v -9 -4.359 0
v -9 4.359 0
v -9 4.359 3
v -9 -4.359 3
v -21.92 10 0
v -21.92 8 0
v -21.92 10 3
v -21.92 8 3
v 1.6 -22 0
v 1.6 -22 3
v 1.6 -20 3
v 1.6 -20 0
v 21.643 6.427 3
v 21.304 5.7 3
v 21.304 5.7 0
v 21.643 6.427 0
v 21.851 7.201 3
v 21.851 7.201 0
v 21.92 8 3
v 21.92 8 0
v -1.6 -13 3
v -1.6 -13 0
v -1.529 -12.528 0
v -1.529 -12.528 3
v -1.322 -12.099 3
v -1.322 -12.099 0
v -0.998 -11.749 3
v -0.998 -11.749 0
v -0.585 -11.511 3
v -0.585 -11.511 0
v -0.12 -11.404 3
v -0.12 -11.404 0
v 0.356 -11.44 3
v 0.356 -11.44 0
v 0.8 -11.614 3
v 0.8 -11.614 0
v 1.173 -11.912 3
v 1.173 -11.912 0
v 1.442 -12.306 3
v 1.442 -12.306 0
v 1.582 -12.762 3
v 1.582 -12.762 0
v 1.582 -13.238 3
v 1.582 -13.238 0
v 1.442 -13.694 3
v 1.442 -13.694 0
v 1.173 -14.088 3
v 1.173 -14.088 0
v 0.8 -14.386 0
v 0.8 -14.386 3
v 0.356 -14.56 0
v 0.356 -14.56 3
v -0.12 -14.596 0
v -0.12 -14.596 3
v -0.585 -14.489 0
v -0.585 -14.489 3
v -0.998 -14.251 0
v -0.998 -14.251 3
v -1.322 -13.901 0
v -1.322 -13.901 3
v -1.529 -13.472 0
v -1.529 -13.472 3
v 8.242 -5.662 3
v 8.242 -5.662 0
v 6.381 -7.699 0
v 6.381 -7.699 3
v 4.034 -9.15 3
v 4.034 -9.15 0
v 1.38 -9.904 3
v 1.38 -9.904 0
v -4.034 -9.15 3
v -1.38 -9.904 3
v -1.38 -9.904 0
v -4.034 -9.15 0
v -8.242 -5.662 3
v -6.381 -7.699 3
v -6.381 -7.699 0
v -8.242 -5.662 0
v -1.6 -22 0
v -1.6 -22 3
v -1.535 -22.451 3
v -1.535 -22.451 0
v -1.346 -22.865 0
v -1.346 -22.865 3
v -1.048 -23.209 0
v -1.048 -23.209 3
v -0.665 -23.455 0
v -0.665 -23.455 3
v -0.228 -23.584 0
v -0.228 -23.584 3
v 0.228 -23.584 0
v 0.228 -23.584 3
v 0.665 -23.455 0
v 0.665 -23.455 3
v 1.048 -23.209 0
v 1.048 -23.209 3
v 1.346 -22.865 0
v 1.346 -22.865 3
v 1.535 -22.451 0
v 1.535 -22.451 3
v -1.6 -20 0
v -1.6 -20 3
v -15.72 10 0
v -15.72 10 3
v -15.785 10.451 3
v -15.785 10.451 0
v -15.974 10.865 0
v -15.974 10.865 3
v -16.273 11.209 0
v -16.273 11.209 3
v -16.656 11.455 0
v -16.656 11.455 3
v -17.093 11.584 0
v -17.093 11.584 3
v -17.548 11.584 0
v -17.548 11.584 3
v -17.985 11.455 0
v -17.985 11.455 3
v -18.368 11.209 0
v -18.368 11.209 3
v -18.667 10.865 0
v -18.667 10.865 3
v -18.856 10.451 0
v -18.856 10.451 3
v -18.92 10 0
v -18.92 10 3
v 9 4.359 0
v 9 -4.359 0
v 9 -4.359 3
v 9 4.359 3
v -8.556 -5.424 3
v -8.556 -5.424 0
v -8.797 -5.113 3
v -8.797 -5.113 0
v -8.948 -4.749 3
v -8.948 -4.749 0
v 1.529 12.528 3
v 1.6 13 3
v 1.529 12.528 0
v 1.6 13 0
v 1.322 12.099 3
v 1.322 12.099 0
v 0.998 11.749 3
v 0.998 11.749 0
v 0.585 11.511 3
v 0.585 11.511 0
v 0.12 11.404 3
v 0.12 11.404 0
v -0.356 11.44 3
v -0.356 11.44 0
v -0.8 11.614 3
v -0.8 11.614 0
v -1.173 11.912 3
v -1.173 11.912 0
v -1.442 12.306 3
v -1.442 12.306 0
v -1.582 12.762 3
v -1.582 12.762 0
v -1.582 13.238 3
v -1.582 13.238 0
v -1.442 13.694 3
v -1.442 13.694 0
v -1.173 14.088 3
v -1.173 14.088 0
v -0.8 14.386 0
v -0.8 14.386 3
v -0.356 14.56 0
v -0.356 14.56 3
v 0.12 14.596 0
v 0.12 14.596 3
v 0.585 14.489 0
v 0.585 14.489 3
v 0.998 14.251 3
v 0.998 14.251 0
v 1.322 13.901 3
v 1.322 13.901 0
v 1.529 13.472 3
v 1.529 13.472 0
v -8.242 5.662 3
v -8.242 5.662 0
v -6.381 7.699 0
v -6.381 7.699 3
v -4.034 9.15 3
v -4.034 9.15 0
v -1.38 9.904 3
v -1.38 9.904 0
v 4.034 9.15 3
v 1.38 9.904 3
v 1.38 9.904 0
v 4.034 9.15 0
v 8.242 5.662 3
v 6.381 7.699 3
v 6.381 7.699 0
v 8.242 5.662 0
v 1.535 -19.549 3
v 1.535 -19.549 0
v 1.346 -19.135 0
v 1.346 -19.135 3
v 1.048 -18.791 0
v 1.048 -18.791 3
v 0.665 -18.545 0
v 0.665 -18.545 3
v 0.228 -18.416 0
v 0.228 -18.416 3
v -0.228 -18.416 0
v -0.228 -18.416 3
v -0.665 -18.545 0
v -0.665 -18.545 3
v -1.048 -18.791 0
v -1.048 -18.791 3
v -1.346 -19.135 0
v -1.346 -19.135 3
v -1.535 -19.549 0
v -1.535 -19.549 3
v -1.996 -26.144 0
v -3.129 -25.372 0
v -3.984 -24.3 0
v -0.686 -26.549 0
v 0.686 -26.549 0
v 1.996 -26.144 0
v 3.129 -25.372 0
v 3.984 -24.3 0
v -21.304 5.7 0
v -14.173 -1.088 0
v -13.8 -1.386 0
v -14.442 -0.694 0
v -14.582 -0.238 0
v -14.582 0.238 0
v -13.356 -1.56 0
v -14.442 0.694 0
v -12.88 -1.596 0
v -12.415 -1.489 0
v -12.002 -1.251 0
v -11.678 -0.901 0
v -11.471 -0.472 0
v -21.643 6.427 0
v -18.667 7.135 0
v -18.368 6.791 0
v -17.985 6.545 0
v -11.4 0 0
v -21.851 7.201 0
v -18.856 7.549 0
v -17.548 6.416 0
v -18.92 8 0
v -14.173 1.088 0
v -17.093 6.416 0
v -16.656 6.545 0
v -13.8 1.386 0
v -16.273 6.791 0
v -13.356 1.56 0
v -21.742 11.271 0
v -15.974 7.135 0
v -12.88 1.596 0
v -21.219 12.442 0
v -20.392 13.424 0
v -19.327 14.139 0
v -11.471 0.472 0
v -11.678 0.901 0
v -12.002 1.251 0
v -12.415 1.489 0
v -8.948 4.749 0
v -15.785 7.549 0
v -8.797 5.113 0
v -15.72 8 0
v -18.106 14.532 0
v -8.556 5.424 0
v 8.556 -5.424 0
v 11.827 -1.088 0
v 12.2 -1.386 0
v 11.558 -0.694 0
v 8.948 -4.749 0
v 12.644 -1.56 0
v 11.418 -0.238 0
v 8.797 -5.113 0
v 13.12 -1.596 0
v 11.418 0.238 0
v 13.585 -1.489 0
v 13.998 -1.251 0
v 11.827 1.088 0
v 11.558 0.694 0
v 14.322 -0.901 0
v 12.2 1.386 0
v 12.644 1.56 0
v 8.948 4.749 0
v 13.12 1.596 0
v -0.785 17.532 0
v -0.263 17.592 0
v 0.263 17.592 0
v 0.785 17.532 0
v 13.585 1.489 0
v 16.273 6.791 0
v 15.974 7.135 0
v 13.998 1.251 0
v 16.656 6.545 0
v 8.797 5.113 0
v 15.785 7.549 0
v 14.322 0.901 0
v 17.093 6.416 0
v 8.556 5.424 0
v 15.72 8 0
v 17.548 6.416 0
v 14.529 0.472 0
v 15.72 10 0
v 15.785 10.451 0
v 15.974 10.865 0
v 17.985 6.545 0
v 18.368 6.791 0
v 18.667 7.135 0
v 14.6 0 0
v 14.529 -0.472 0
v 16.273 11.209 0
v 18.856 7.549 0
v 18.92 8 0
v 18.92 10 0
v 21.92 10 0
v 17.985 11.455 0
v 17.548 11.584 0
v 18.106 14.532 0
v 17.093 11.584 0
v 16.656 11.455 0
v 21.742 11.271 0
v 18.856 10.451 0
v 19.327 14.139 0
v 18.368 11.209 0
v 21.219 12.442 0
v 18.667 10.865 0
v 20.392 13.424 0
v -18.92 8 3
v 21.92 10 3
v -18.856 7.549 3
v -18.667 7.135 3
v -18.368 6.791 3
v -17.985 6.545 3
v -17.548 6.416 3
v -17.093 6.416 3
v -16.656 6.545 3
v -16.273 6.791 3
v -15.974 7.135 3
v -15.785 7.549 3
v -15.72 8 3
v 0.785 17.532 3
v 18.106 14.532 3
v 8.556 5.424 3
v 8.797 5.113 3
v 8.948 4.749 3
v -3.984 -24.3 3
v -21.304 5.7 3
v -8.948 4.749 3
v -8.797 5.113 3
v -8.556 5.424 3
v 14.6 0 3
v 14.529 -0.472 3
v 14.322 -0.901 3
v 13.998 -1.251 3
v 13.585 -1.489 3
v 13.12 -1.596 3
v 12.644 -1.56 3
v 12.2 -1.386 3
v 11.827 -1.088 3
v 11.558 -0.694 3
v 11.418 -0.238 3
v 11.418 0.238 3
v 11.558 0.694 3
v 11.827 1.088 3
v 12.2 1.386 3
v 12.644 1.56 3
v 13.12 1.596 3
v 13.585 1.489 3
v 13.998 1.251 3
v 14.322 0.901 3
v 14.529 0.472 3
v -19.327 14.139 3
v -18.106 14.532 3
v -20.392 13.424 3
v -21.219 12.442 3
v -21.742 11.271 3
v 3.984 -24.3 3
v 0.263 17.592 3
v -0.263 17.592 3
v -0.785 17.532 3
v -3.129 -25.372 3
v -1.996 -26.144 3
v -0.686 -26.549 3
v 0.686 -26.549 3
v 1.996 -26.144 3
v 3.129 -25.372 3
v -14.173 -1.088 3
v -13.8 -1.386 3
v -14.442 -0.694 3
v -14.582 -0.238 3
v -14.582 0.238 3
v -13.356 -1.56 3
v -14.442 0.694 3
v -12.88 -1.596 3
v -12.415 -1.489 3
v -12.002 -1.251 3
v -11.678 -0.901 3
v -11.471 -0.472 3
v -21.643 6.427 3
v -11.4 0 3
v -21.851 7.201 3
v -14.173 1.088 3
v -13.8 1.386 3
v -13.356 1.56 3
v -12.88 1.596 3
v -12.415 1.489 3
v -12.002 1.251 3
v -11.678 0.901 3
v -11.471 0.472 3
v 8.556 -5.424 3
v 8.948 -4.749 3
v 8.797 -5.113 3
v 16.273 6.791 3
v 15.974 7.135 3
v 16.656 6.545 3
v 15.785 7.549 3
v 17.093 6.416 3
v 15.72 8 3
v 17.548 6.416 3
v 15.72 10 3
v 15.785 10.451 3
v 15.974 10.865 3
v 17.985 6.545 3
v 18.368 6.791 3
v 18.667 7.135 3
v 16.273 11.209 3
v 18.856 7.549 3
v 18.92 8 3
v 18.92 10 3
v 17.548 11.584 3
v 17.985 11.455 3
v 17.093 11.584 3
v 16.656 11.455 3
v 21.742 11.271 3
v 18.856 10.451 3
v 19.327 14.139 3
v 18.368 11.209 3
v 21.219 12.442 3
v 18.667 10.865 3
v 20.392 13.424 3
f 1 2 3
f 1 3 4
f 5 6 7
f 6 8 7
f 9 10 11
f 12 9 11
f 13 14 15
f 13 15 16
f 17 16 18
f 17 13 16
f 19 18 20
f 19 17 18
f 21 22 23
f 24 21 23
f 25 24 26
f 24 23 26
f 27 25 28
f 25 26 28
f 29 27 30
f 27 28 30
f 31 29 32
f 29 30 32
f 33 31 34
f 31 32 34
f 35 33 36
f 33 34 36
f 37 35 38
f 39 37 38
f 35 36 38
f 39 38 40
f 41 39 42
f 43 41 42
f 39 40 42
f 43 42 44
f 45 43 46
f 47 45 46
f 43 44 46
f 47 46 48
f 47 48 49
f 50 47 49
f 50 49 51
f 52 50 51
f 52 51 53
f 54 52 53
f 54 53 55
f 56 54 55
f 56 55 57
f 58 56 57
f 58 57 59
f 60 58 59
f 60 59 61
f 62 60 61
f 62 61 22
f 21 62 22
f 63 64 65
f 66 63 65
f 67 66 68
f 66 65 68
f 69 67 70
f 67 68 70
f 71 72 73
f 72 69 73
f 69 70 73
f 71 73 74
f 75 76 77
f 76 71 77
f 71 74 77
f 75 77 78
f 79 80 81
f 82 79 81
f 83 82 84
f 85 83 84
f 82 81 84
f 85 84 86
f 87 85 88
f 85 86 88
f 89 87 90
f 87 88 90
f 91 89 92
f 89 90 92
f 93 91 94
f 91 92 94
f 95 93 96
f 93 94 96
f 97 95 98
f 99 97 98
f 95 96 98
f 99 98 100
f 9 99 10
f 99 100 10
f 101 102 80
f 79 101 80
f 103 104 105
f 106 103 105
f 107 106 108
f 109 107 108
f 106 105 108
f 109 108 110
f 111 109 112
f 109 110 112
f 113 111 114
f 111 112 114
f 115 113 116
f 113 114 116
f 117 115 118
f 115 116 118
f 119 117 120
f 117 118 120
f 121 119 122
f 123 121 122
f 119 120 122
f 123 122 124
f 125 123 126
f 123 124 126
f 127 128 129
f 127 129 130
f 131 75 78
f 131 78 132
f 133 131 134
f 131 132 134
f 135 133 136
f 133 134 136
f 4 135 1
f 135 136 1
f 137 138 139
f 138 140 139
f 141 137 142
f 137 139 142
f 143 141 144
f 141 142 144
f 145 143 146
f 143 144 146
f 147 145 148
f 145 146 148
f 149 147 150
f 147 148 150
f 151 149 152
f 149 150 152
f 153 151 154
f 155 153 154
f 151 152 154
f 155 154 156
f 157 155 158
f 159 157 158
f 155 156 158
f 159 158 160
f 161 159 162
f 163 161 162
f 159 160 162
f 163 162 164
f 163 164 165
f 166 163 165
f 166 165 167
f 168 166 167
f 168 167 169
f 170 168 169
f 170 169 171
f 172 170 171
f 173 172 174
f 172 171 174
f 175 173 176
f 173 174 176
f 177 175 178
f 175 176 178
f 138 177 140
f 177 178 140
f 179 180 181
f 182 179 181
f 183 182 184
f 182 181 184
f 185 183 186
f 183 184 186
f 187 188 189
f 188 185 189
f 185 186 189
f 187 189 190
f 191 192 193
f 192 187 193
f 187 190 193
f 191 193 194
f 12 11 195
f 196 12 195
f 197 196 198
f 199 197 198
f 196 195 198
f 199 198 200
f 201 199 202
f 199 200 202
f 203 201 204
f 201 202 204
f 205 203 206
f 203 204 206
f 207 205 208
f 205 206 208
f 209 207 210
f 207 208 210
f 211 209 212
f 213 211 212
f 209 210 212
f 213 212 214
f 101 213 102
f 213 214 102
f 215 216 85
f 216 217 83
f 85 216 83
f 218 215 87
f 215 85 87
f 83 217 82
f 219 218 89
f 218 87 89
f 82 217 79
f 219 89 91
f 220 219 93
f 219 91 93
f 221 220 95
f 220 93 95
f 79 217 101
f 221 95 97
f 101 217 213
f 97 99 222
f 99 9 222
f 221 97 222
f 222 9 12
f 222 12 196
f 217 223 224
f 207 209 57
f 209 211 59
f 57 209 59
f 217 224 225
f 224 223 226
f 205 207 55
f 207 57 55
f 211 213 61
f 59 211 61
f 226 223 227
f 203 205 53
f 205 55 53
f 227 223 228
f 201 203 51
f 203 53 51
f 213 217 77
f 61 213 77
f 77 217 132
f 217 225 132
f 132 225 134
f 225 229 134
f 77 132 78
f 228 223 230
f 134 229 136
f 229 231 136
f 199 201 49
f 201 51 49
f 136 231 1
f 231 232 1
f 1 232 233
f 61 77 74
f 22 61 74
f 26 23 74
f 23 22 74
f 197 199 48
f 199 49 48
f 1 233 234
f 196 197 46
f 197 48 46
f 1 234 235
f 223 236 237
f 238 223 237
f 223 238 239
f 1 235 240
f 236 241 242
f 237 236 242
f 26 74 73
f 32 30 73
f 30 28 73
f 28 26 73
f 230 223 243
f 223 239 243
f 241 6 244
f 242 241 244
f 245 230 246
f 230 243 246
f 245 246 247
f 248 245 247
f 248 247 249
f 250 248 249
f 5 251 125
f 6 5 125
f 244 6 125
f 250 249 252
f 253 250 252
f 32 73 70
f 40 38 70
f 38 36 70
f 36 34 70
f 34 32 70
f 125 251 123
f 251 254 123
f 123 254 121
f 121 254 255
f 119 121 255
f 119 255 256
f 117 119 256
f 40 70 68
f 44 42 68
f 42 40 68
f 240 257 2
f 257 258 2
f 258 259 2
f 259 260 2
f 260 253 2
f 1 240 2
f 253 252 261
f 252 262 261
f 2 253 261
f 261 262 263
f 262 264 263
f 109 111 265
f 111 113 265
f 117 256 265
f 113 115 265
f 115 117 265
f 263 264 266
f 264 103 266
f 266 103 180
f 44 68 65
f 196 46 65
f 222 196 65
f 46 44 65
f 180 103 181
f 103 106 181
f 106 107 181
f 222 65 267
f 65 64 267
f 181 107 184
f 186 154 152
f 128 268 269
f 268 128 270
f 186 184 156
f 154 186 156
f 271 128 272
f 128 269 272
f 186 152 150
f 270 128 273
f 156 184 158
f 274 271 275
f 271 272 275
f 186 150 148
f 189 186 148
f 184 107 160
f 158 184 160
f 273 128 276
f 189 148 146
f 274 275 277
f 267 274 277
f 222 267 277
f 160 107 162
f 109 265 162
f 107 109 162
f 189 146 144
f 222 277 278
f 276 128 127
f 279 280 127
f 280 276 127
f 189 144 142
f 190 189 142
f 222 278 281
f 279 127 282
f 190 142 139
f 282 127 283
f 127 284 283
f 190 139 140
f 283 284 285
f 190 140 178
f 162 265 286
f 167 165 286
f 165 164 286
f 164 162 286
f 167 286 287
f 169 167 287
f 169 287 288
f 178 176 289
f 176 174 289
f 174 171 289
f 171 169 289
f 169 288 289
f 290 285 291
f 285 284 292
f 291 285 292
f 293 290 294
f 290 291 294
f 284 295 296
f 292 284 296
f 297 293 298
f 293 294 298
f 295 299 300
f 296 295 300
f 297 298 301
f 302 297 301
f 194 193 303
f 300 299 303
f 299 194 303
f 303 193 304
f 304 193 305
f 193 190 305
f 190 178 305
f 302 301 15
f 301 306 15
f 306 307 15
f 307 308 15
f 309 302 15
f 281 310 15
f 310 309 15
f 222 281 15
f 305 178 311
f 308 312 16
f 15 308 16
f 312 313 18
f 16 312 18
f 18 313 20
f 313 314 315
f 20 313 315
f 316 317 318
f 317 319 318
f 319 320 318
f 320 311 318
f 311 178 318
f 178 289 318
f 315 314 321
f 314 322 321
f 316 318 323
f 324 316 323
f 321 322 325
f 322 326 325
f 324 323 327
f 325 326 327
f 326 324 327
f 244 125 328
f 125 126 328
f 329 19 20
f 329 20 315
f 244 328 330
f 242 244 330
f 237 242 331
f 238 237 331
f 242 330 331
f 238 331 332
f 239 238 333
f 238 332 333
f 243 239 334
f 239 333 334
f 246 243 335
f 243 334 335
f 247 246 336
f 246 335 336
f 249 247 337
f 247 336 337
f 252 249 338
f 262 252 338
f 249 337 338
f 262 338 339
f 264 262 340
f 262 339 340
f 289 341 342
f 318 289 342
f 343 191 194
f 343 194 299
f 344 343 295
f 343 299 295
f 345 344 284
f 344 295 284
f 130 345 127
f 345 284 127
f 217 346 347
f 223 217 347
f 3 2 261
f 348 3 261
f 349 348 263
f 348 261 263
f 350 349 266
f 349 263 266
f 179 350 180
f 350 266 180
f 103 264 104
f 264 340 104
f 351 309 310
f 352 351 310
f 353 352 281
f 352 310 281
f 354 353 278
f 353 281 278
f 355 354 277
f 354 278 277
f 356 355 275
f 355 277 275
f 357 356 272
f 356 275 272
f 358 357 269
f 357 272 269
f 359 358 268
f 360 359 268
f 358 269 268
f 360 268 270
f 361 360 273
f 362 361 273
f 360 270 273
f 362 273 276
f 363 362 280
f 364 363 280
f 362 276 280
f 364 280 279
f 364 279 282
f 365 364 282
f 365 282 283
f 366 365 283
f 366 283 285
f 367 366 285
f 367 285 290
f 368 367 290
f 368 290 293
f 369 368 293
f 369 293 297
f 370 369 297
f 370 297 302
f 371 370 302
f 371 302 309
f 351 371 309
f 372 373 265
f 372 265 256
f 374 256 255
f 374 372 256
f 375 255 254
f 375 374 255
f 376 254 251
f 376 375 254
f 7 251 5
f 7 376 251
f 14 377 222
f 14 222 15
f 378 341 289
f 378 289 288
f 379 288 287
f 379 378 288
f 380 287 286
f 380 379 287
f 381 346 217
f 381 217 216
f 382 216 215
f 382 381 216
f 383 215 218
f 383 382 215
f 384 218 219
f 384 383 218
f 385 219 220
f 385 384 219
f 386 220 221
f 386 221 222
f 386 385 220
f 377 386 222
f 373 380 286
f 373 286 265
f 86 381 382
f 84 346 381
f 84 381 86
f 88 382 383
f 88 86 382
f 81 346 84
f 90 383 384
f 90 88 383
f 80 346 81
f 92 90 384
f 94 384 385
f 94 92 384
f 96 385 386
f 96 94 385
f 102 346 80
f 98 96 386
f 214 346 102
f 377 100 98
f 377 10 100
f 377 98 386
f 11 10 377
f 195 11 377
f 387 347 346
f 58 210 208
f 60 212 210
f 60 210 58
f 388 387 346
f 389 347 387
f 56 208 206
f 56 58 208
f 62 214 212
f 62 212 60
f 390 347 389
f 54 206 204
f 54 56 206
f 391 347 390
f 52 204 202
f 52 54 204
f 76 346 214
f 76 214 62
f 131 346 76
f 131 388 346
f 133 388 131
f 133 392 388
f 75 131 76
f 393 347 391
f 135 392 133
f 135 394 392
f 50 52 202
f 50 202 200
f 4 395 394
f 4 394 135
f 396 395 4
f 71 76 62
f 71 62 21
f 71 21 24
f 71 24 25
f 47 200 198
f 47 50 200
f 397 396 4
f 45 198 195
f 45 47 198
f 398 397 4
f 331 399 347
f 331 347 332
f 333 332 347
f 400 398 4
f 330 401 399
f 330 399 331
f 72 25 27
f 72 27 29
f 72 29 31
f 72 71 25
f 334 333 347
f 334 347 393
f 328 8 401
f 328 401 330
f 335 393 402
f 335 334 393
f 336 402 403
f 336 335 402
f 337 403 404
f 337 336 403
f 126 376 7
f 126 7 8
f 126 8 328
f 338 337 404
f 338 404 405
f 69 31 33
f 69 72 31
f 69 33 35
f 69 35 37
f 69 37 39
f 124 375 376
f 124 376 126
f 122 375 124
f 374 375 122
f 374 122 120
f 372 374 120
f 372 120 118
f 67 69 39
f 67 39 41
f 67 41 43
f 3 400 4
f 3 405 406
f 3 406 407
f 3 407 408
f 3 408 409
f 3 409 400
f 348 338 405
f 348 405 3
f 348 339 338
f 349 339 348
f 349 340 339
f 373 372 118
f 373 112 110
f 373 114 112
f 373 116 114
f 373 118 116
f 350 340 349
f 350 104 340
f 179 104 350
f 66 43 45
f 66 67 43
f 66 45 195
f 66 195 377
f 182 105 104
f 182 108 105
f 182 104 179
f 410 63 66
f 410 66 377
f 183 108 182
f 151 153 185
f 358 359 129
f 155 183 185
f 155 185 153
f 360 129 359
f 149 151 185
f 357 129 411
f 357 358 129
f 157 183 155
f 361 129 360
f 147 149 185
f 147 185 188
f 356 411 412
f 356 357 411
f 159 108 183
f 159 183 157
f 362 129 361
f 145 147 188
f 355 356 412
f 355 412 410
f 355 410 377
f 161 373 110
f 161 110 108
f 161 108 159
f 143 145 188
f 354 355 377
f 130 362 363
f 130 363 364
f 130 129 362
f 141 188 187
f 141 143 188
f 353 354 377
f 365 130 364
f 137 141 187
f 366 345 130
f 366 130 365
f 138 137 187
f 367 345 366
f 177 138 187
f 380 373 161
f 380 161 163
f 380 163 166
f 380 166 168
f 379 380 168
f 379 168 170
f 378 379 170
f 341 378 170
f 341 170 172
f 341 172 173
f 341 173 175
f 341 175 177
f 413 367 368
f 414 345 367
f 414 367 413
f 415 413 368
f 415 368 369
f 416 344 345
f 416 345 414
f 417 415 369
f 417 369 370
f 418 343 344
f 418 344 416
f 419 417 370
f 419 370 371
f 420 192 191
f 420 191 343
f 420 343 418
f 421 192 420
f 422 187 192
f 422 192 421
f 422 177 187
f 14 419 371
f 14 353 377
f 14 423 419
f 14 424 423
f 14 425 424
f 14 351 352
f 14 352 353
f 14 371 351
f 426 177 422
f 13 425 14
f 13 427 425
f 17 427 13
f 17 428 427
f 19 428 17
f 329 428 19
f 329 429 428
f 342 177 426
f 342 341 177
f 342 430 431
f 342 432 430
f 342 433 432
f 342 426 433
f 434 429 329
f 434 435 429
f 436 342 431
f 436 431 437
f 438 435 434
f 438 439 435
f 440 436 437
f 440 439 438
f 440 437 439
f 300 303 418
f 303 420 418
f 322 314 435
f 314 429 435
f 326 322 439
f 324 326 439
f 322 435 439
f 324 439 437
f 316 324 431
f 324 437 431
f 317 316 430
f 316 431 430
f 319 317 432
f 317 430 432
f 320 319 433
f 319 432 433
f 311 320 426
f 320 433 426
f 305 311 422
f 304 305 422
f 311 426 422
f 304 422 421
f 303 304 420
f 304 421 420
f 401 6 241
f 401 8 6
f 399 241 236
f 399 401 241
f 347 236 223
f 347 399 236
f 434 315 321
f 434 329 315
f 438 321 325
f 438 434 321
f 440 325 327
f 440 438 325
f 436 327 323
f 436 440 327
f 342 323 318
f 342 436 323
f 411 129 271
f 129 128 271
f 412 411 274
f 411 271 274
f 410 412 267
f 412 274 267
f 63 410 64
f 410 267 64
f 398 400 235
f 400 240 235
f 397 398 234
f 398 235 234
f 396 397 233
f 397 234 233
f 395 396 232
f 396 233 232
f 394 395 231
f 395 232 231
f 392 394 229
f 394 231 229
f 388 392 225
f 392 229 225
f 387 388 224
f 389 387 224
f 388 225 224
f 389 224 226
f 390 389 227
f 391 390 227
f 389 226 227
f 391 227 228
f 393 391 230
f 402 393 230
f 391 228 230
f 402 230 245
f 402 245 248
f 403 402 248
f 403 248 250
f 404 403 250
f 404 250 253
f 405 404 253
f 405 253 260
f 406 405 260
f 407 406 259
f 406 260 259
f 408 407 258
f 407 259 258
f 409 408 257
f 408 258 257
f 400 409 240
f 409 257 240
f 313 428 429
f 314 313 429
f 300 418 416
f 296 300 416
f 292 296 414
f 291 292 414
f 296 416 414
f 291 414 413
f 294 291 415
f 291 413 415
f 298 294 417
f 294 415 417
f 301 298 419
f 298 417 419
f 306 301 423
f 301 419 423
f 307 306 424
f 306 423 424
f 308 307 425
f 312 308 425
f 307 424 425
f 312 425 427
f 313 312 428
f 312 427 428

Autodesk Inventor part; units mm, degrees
ref_plane "YZ Plane" through (0, 0, 0) normal (1, 0, 0) x (0, 1, 0)
ref_plane "XZ Plane" through (0, 0, 0) normal (0, 1, 0) x (-1, 0, 0)
ref_plane "XY Plane" through (0, 0, 0) normal (0, 0, 1) x (1, 0, 0)
sketch "スケッチ1" plane through (0, 0, 0) normal (0, 0, 1) x (1, 0, 0)
  line L0 (9, -4.3589) -> (9, 4.3589)
  line L1 (-9, 4.3589) -> (-9, -4.3589)
  arc A0 (8.2425, 5.6622) -> (-8.2425, 5.6622) centre (0, 0) ccw
  arc A1 (-8.2425, 5.6622) -> (-9, 4.3589) centre (-7.5, 4.3589) ccw
  arc A2 (9, 4.3589) -> (8.2425, 5.6622) centre (7.5, 4.3589) ccw
  arc A3 (8.2425, -5.6622) -> (9, -4.3589) centre (7.5, -4.3589) ccw
  arc A4 (-9, -4.3589) -> (-8.2425, -5.6622) centre (-7.5, -4.3589) ccw
  arc A5 (-8.2425, -5.6622) -> (8.2425, -5.6622) centre (0, 0) ccw
  line L2 (-9, 0) -> (9, 0) construction
  line L3 (-13, 0) -> (-13, 0) construction
  line L4 (-14.6, 0) -> (-14.6, 0)
  line L5 (-11.4, 0) -> (-11.4, 0)
  arc A6 (-11.4, 0) -> (-14.6, 0) centre (-13, 0) ccw
  arc A7 (-14.6, 0) -> (-11.4, 0) centre (-13, 0) ccw
  line L6 (25, -30) -> (-25, -30)
  line L7 (-25, -30) -> (-25, 30)
  line L8 (-25, 30) -> (25, 30)
  line L9 (25, 30) -> (25, -30)
  line L10 (25, -30) -> (-25, 30) construction
  line L11 (-25, -30) -> (25, 30) construction
  line L12 (13, 0) -> (13, 0) construction
  line L13 (11.4, 0) -> (11.4, 0)
  line L14 (14.6, 0) -> (14.6, 0)
  arc A8 (14.6, 0) -> (11.4, 0) centre (13, 0) ccw
  arc A9 (11.4, 0) -> (14.6, 0) centre (13, 0) ccw
  line L15 (0, 13) -> (0, 13) construction
  line L16 (-1.6, 13) -> (-1.6, 13)
  line L17 (1.6, 13) -> (1.6, 13)
  arc A10 (1.6, 13) -> (-1.6, 13) centre (0, 13) ccw
  arc A11 (-1.6, 13) -> (1.6, 13) centre (0, 13) ccw
  line L18 (0, -13) -> (0, -13) construction
  line L19 (1.6, -13) -> (1.6, -13)
  line L20 (-1.6, -13) -> (-1.6, -13)
  arc A12 (-1.6, -13) -> (1.6, -13) centre (0, -13) ccw
  arc A13 (1.6, -13) -> (-1.6, -13) centre (0, -13) ccw
  point P0 (0, 0)
  point P1 (0, 13)
  point P2 (0, -13)
  dimension "d2" = 18
  dimension "d3" = 3
  dimension "d5" = 10
  dimension "d6" = 0
  dimension "d7" = 10
  dimension "d8" = 3.2
  dimension "d9" = 13
  dimension "d10" = 0
  dimension "d11" = 50
  dimension "d12" = 60
  dimension "d22" = 13
  dimension "d23" = 13
  dimension "d24" = 13
extrude "押し出し1" add sketch "スケッチ1" along normal blind 3
sketch "スケッチ3" plane through (0, 0, 3) normal (0, 0, 1) x (1, 0, 0)
  line L0 (0, -22) -> (0, -20) construction
  line L1 (1.6, -22) -> (1.6, -20)
  line L2 (-1.6, -20) -> (-1.6, -22)
  arc A0 (-1.6, -22) -> (1.6, -22) centre (0, -22) ccw
  arc A1 (1.6, -20) -> (-1.6, -20) centre (0, -20) ccw
  line L3 (-17.3205, 10) -> (-17.3205, 8) construction
  line L4 (-18.9205, 10) -> (-18.9205, 8)
  line L5 (-15.7205, 8) -> (-15.7205, 10)
  arc A2 (-15.7205, 10) -> (-18.9205, 10) centre (-17.3205, 10) ccw
  arc A3 (-18.9205, 8) -> (-15.7205, 8) centre (-17.3205, 8) ccw
  line L6 (17.3205, 10) -> (17.3205, 8) construction
  line L7 (15.7205, 10) -> (15.7205, 8)
  line L8 (18.9205, 8) -> (18.9205, 10)
  arc A4 (18.9205, 10) -> (15.7205, 10) centre (17.3205, 10) ccw
  arc A5 (15.7205, 8) -> (18.9205, 8) centre (17.3205, 8) ccw
  circle A6 centre (0, 0) radius 20 construction
  point P0 (0, -21)
  point P1 (-17.3205, 9)
  point P2 (17.3205, 9)
  dimension "d26" = 2
  dimension "d27" = 1.6
  dimension "d28" = 20
  dimension "d29" = 120
extrude "押し出し4" cut sketch "スケッチ3" against normal blind 3
sketch "スケッチ4" plane through (0, 0, 3) normal (0, 0, 1) x (1, 0, 0)
  arc A0 (-18.9205, 8) -> (-15.7205, 8) centre (-17.3205, 8) ccw projected
  line L0 (-18.9205, 8) -> (-18.9205, 10) projected
  arc A1 (-15.7205, 10) -> (-18.9205, 10) centre (-17.3205, 10) ccw projected
  line L1 (-15.7205, 10) -> (-15.7205, 8) projected
  arc A2 (1.6, -20) -> (-1.6, -20) centre (0, -20) ccw projected
  line L2 (1.6, -20) -> (1.6, -22) projected
  arc A3 (-1.6, -22) -> (1.6, -22) centre (0, -22) ccw projected
  line L3 (-1.6, -22) -> (-1.6, -20) projected
  arc A4 (15.7205, 8) -> (18.9205, 8) centre (17.3205, 8) ccw projected
  line L4 (15.7205, 8) -> (15.7205, 10) projected
  arc A5 (18.9205, 10) -> (15.7205, 10) centre (17.3205, 10) ccw projected
  line L5 (18.9205, 10) -> (18.9205, 8) projected
  arc A6 (8.2425, -5.6622) -> (9, -4.3589) centre (7.5, -4.3589) ccw projected
  arc A7 (-8.2425, -5.6622) -> (8.2425, -5.6622) centre (0, 0) ccw projected
  arc A8 (-9, -4.3589) -> (-8.2425, -5.6622) centre (-7.5, -4.3589) ccw projected
  line L6 (-9, -4.3589) -> (-9, 4.3589) projected
  arc A9 (-8.2425, 5.6622) -> (-9, 4.3589) centre (-7.5, 4.3589) ccw projected
  arc A10 (8.2425, 5.6622) -> (-8.2425, 5.6622) centre (0, 0) ccw projected
  arc A11 (9, 4.3589) -> (8.2425, 5.6622) centre (7.5, 4.3589) ccw projected
  line L7 (9, 4.3589) -> (9, -4.3589) projected
  circle A12 centre (0, -13) radius 1.6 projected
  circle A13 centre (0, 13) radius 1.6 projected
  circle A14 centre (13, 0) radius 1.6 projected
  circle A15 centre (-13, 0) radius 1.6 projected
  line L8 (-25, -30) -> (25, -30) projected
  line L9 (25, -30) -> (25, 30) projected
  line L10 (25, 30) -> (-25, 30) projected
  line L11 (-25, 30) -> (-25, -30) projected
  arc A16 (-21.9205, 8) -> (-12.7205, 8) centre (-17.3205, 8) ccw
  line L12 (-21.9205, 8) -> (-21.9205, 10)
  arc A17 (-12.7205, 10) -> (-21.9205, 10) centre (-17.3205, 10) ccw
  line L13 (-12.7205, 10) -> (-12.7205, 8)
  line L14 (12.7205, 10) -> (12.7205, 8)
  arc A18 (12.7205, 8) -> (21.9205, 8) centre (17.3205, 8) ccw
  line L15 (21.9205, 8) -> (21.9205, 10)
  arc A19 (21.9205, 10) -> (12.7205, 10) centre (17.3205, 10) ccw
  circle A20 centre (0, 13) radius 4.6
  arc A21 (4.6, -20) -> (-4.6, -20) centre (0, -20) ccw
  line L16 (4.6, -20) -> (4.6, -22)
  arc A22 (-4.6, -22) -> (4.6, -22) centre (0, -22) ccw
  line L17 (-4.6, -22) -> (-4.6, -20)
  line L18 (-3.9837, -24.3) -> (-21.3042, 5.7)
  line L19 (3.9837, -24.3) -> (21.3042, 5.7)
  line L20 (0.7851, 17.5325) -> (18.1056, 14.5325)
  line L21 (-0.7851, 17.5325) -> (-18.1056, 14.5325)
  dimension "d32" = 3
  dimension "d33" = 3
  dimension "d34" = 3
  dimension "d35" = 3
extrude "押し出し5" cut sketch "スケッチ4" against normal blind 3 contours L0 A1 L1 A0 | L2 A3 L3 A2 | L4 A5 L5 A4 | A7 A8 L6 A9 A10 A20 A11 L7 A6 | A6 L7 A11 A10 A20 L20 A19 L14 A18 L19 A22 L16 A21 L17 L18 A16 L13 A17 L21 A9 L6 A8 A7 | A20 A10 | A10 A20 | A17 L13 A16 L12 | A19 L15 A18 L14 | A22 L17 A21 L16 | A12 | A13 | A14 | A15 keep common part
equation "\"d22\" = d9"
equation "\"d23\" = d9"
equation "\"d24\" = d23 + d10"
properties part number "RS555-71Mount"
